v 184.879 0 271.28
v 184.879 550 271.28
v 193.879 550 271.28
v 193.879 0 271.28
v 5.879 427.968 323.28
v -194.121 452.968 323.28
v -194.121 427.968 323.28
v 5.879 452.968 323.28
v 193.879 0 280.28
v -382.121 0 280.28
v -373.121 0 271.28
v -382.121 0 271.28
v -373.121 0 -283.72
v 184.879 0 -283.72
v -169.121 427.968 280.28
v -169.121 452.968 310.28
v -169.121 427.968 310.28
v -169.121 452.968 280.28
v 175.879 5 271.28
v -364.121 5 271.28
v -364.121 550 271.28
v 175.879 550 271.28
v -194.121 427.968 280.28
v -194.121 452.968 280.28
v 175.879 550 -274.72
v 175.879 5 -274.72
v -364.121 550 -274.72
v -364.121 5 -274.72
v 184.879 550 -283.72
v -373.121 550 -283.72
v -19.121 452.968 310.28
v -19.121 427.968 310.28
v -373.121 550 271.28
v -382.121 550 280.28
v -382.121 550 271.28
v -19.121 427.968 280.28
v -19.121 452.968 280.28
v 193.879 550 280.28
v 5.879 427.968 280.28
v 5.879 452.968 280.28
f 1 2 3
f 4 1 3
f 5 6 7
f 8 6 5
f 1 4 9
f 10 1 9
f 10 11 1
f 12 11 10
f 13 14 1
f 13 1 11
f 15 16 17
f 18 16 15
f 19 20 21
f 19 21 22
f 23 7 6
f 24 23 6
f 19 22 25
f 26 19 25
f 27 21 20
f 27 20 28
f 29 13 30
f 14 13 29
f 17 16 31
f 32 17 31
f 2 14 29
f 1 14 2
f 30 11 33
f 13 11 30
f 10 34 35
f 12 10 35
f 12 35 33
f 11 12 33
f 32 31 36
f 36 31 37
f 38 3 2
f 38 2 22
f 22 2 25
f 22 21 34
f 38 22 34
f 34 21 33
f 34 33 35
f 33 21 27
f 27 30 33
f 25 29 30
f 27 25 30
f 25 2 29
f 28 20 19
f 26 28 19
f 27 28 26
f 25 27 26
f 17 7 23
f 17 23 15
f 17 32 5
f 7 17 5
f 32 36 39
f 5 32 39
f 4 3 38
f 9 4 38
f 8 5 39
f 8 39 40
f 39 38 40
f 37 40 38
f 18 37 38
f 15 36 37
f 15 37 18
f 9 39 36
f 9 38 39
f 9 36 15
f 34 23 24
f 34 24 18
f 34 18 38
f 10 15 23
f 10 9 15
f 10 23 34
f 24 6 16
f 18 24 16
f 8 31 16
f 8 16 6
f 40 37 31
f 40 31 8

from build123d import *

# Parameters (mm, degrees)
BOSS_EXTRUDE1_DEPTH = 550
SKETCH3_W           = 540
SKETCH3_H           = 546
CUT_EXTRUDE1_DEPTH  = 545
SKETCH4_W           = 200
SKETCH4_H           = 25
BOSS_EXTRUDE2_DEPTH = 43
SKETCH6_W           = 150
SKETCH6_H           = 30
CUT_EXTRUDE2_DEPTH  = 25


with BuildPart() as part:
    # Sketch1 → Boss-Extrude1 (new body)
    with BuildSketch(Plane(origin=(0, 0, 0), x_dir=(1, 0, 0), z_dir=(0, 1, 0))):
        Polygon((-382.12099403, -271.280172414), (-373.12099403, -271.280172414), (-373.12099403, 283.719827586), (184.87900597, 283.719827586), (184.87900597, -271.280172414), (193.87900597, -271.280172414), (193.87900597, -280.280172414), (-382.12099403, -280.280172414), align=None)
    extrude(amount=BOSS_EXTRUDE1_DEPTH)

    # Sketch3 → Cut-Extrude1 (cut)
    with BuildSketch(Plane(origin=(0, 550, 0), x_dir=(1, 0, 0), z_dir=(0, 1, 0))):
        with Locations((-94.12099403, 1.719827586)):
            Rectangle(SKETCH3_W, SKETCH3_H)
    extrude(amount=-CUT_EXTRUDE1_DEPTH, mode=Mode.SUBTRACT)

    # Sketch4 → Boss-Extrude2 (add)
    with BuildSketch(Plane.XY.offset(280.280172414)):
        with Locations((-94.12099403, 440.468229794)):
            Rectangle(SKETCH4_W, SKETCH4_H)
    extrude(amount=BOSS_EXTRUDE2_DEPTH)

    # Sketch6 → Cut-Extrude2 (cut)
    with BuildSketch(Plane(origin=(0, 452.968229794, 0), x_dir=(1, 0, 0), z_dir=(0, 1, 0))):
        with Locations((-94.12099403, -295.280172414)):
            Rectangle(SKETCH6_W, SKETCH6_H)
    extrude(amount=-CUT_EXTRUDE2_DEPTH, mode=Mode.SUBTRACT)


solid = part.part
